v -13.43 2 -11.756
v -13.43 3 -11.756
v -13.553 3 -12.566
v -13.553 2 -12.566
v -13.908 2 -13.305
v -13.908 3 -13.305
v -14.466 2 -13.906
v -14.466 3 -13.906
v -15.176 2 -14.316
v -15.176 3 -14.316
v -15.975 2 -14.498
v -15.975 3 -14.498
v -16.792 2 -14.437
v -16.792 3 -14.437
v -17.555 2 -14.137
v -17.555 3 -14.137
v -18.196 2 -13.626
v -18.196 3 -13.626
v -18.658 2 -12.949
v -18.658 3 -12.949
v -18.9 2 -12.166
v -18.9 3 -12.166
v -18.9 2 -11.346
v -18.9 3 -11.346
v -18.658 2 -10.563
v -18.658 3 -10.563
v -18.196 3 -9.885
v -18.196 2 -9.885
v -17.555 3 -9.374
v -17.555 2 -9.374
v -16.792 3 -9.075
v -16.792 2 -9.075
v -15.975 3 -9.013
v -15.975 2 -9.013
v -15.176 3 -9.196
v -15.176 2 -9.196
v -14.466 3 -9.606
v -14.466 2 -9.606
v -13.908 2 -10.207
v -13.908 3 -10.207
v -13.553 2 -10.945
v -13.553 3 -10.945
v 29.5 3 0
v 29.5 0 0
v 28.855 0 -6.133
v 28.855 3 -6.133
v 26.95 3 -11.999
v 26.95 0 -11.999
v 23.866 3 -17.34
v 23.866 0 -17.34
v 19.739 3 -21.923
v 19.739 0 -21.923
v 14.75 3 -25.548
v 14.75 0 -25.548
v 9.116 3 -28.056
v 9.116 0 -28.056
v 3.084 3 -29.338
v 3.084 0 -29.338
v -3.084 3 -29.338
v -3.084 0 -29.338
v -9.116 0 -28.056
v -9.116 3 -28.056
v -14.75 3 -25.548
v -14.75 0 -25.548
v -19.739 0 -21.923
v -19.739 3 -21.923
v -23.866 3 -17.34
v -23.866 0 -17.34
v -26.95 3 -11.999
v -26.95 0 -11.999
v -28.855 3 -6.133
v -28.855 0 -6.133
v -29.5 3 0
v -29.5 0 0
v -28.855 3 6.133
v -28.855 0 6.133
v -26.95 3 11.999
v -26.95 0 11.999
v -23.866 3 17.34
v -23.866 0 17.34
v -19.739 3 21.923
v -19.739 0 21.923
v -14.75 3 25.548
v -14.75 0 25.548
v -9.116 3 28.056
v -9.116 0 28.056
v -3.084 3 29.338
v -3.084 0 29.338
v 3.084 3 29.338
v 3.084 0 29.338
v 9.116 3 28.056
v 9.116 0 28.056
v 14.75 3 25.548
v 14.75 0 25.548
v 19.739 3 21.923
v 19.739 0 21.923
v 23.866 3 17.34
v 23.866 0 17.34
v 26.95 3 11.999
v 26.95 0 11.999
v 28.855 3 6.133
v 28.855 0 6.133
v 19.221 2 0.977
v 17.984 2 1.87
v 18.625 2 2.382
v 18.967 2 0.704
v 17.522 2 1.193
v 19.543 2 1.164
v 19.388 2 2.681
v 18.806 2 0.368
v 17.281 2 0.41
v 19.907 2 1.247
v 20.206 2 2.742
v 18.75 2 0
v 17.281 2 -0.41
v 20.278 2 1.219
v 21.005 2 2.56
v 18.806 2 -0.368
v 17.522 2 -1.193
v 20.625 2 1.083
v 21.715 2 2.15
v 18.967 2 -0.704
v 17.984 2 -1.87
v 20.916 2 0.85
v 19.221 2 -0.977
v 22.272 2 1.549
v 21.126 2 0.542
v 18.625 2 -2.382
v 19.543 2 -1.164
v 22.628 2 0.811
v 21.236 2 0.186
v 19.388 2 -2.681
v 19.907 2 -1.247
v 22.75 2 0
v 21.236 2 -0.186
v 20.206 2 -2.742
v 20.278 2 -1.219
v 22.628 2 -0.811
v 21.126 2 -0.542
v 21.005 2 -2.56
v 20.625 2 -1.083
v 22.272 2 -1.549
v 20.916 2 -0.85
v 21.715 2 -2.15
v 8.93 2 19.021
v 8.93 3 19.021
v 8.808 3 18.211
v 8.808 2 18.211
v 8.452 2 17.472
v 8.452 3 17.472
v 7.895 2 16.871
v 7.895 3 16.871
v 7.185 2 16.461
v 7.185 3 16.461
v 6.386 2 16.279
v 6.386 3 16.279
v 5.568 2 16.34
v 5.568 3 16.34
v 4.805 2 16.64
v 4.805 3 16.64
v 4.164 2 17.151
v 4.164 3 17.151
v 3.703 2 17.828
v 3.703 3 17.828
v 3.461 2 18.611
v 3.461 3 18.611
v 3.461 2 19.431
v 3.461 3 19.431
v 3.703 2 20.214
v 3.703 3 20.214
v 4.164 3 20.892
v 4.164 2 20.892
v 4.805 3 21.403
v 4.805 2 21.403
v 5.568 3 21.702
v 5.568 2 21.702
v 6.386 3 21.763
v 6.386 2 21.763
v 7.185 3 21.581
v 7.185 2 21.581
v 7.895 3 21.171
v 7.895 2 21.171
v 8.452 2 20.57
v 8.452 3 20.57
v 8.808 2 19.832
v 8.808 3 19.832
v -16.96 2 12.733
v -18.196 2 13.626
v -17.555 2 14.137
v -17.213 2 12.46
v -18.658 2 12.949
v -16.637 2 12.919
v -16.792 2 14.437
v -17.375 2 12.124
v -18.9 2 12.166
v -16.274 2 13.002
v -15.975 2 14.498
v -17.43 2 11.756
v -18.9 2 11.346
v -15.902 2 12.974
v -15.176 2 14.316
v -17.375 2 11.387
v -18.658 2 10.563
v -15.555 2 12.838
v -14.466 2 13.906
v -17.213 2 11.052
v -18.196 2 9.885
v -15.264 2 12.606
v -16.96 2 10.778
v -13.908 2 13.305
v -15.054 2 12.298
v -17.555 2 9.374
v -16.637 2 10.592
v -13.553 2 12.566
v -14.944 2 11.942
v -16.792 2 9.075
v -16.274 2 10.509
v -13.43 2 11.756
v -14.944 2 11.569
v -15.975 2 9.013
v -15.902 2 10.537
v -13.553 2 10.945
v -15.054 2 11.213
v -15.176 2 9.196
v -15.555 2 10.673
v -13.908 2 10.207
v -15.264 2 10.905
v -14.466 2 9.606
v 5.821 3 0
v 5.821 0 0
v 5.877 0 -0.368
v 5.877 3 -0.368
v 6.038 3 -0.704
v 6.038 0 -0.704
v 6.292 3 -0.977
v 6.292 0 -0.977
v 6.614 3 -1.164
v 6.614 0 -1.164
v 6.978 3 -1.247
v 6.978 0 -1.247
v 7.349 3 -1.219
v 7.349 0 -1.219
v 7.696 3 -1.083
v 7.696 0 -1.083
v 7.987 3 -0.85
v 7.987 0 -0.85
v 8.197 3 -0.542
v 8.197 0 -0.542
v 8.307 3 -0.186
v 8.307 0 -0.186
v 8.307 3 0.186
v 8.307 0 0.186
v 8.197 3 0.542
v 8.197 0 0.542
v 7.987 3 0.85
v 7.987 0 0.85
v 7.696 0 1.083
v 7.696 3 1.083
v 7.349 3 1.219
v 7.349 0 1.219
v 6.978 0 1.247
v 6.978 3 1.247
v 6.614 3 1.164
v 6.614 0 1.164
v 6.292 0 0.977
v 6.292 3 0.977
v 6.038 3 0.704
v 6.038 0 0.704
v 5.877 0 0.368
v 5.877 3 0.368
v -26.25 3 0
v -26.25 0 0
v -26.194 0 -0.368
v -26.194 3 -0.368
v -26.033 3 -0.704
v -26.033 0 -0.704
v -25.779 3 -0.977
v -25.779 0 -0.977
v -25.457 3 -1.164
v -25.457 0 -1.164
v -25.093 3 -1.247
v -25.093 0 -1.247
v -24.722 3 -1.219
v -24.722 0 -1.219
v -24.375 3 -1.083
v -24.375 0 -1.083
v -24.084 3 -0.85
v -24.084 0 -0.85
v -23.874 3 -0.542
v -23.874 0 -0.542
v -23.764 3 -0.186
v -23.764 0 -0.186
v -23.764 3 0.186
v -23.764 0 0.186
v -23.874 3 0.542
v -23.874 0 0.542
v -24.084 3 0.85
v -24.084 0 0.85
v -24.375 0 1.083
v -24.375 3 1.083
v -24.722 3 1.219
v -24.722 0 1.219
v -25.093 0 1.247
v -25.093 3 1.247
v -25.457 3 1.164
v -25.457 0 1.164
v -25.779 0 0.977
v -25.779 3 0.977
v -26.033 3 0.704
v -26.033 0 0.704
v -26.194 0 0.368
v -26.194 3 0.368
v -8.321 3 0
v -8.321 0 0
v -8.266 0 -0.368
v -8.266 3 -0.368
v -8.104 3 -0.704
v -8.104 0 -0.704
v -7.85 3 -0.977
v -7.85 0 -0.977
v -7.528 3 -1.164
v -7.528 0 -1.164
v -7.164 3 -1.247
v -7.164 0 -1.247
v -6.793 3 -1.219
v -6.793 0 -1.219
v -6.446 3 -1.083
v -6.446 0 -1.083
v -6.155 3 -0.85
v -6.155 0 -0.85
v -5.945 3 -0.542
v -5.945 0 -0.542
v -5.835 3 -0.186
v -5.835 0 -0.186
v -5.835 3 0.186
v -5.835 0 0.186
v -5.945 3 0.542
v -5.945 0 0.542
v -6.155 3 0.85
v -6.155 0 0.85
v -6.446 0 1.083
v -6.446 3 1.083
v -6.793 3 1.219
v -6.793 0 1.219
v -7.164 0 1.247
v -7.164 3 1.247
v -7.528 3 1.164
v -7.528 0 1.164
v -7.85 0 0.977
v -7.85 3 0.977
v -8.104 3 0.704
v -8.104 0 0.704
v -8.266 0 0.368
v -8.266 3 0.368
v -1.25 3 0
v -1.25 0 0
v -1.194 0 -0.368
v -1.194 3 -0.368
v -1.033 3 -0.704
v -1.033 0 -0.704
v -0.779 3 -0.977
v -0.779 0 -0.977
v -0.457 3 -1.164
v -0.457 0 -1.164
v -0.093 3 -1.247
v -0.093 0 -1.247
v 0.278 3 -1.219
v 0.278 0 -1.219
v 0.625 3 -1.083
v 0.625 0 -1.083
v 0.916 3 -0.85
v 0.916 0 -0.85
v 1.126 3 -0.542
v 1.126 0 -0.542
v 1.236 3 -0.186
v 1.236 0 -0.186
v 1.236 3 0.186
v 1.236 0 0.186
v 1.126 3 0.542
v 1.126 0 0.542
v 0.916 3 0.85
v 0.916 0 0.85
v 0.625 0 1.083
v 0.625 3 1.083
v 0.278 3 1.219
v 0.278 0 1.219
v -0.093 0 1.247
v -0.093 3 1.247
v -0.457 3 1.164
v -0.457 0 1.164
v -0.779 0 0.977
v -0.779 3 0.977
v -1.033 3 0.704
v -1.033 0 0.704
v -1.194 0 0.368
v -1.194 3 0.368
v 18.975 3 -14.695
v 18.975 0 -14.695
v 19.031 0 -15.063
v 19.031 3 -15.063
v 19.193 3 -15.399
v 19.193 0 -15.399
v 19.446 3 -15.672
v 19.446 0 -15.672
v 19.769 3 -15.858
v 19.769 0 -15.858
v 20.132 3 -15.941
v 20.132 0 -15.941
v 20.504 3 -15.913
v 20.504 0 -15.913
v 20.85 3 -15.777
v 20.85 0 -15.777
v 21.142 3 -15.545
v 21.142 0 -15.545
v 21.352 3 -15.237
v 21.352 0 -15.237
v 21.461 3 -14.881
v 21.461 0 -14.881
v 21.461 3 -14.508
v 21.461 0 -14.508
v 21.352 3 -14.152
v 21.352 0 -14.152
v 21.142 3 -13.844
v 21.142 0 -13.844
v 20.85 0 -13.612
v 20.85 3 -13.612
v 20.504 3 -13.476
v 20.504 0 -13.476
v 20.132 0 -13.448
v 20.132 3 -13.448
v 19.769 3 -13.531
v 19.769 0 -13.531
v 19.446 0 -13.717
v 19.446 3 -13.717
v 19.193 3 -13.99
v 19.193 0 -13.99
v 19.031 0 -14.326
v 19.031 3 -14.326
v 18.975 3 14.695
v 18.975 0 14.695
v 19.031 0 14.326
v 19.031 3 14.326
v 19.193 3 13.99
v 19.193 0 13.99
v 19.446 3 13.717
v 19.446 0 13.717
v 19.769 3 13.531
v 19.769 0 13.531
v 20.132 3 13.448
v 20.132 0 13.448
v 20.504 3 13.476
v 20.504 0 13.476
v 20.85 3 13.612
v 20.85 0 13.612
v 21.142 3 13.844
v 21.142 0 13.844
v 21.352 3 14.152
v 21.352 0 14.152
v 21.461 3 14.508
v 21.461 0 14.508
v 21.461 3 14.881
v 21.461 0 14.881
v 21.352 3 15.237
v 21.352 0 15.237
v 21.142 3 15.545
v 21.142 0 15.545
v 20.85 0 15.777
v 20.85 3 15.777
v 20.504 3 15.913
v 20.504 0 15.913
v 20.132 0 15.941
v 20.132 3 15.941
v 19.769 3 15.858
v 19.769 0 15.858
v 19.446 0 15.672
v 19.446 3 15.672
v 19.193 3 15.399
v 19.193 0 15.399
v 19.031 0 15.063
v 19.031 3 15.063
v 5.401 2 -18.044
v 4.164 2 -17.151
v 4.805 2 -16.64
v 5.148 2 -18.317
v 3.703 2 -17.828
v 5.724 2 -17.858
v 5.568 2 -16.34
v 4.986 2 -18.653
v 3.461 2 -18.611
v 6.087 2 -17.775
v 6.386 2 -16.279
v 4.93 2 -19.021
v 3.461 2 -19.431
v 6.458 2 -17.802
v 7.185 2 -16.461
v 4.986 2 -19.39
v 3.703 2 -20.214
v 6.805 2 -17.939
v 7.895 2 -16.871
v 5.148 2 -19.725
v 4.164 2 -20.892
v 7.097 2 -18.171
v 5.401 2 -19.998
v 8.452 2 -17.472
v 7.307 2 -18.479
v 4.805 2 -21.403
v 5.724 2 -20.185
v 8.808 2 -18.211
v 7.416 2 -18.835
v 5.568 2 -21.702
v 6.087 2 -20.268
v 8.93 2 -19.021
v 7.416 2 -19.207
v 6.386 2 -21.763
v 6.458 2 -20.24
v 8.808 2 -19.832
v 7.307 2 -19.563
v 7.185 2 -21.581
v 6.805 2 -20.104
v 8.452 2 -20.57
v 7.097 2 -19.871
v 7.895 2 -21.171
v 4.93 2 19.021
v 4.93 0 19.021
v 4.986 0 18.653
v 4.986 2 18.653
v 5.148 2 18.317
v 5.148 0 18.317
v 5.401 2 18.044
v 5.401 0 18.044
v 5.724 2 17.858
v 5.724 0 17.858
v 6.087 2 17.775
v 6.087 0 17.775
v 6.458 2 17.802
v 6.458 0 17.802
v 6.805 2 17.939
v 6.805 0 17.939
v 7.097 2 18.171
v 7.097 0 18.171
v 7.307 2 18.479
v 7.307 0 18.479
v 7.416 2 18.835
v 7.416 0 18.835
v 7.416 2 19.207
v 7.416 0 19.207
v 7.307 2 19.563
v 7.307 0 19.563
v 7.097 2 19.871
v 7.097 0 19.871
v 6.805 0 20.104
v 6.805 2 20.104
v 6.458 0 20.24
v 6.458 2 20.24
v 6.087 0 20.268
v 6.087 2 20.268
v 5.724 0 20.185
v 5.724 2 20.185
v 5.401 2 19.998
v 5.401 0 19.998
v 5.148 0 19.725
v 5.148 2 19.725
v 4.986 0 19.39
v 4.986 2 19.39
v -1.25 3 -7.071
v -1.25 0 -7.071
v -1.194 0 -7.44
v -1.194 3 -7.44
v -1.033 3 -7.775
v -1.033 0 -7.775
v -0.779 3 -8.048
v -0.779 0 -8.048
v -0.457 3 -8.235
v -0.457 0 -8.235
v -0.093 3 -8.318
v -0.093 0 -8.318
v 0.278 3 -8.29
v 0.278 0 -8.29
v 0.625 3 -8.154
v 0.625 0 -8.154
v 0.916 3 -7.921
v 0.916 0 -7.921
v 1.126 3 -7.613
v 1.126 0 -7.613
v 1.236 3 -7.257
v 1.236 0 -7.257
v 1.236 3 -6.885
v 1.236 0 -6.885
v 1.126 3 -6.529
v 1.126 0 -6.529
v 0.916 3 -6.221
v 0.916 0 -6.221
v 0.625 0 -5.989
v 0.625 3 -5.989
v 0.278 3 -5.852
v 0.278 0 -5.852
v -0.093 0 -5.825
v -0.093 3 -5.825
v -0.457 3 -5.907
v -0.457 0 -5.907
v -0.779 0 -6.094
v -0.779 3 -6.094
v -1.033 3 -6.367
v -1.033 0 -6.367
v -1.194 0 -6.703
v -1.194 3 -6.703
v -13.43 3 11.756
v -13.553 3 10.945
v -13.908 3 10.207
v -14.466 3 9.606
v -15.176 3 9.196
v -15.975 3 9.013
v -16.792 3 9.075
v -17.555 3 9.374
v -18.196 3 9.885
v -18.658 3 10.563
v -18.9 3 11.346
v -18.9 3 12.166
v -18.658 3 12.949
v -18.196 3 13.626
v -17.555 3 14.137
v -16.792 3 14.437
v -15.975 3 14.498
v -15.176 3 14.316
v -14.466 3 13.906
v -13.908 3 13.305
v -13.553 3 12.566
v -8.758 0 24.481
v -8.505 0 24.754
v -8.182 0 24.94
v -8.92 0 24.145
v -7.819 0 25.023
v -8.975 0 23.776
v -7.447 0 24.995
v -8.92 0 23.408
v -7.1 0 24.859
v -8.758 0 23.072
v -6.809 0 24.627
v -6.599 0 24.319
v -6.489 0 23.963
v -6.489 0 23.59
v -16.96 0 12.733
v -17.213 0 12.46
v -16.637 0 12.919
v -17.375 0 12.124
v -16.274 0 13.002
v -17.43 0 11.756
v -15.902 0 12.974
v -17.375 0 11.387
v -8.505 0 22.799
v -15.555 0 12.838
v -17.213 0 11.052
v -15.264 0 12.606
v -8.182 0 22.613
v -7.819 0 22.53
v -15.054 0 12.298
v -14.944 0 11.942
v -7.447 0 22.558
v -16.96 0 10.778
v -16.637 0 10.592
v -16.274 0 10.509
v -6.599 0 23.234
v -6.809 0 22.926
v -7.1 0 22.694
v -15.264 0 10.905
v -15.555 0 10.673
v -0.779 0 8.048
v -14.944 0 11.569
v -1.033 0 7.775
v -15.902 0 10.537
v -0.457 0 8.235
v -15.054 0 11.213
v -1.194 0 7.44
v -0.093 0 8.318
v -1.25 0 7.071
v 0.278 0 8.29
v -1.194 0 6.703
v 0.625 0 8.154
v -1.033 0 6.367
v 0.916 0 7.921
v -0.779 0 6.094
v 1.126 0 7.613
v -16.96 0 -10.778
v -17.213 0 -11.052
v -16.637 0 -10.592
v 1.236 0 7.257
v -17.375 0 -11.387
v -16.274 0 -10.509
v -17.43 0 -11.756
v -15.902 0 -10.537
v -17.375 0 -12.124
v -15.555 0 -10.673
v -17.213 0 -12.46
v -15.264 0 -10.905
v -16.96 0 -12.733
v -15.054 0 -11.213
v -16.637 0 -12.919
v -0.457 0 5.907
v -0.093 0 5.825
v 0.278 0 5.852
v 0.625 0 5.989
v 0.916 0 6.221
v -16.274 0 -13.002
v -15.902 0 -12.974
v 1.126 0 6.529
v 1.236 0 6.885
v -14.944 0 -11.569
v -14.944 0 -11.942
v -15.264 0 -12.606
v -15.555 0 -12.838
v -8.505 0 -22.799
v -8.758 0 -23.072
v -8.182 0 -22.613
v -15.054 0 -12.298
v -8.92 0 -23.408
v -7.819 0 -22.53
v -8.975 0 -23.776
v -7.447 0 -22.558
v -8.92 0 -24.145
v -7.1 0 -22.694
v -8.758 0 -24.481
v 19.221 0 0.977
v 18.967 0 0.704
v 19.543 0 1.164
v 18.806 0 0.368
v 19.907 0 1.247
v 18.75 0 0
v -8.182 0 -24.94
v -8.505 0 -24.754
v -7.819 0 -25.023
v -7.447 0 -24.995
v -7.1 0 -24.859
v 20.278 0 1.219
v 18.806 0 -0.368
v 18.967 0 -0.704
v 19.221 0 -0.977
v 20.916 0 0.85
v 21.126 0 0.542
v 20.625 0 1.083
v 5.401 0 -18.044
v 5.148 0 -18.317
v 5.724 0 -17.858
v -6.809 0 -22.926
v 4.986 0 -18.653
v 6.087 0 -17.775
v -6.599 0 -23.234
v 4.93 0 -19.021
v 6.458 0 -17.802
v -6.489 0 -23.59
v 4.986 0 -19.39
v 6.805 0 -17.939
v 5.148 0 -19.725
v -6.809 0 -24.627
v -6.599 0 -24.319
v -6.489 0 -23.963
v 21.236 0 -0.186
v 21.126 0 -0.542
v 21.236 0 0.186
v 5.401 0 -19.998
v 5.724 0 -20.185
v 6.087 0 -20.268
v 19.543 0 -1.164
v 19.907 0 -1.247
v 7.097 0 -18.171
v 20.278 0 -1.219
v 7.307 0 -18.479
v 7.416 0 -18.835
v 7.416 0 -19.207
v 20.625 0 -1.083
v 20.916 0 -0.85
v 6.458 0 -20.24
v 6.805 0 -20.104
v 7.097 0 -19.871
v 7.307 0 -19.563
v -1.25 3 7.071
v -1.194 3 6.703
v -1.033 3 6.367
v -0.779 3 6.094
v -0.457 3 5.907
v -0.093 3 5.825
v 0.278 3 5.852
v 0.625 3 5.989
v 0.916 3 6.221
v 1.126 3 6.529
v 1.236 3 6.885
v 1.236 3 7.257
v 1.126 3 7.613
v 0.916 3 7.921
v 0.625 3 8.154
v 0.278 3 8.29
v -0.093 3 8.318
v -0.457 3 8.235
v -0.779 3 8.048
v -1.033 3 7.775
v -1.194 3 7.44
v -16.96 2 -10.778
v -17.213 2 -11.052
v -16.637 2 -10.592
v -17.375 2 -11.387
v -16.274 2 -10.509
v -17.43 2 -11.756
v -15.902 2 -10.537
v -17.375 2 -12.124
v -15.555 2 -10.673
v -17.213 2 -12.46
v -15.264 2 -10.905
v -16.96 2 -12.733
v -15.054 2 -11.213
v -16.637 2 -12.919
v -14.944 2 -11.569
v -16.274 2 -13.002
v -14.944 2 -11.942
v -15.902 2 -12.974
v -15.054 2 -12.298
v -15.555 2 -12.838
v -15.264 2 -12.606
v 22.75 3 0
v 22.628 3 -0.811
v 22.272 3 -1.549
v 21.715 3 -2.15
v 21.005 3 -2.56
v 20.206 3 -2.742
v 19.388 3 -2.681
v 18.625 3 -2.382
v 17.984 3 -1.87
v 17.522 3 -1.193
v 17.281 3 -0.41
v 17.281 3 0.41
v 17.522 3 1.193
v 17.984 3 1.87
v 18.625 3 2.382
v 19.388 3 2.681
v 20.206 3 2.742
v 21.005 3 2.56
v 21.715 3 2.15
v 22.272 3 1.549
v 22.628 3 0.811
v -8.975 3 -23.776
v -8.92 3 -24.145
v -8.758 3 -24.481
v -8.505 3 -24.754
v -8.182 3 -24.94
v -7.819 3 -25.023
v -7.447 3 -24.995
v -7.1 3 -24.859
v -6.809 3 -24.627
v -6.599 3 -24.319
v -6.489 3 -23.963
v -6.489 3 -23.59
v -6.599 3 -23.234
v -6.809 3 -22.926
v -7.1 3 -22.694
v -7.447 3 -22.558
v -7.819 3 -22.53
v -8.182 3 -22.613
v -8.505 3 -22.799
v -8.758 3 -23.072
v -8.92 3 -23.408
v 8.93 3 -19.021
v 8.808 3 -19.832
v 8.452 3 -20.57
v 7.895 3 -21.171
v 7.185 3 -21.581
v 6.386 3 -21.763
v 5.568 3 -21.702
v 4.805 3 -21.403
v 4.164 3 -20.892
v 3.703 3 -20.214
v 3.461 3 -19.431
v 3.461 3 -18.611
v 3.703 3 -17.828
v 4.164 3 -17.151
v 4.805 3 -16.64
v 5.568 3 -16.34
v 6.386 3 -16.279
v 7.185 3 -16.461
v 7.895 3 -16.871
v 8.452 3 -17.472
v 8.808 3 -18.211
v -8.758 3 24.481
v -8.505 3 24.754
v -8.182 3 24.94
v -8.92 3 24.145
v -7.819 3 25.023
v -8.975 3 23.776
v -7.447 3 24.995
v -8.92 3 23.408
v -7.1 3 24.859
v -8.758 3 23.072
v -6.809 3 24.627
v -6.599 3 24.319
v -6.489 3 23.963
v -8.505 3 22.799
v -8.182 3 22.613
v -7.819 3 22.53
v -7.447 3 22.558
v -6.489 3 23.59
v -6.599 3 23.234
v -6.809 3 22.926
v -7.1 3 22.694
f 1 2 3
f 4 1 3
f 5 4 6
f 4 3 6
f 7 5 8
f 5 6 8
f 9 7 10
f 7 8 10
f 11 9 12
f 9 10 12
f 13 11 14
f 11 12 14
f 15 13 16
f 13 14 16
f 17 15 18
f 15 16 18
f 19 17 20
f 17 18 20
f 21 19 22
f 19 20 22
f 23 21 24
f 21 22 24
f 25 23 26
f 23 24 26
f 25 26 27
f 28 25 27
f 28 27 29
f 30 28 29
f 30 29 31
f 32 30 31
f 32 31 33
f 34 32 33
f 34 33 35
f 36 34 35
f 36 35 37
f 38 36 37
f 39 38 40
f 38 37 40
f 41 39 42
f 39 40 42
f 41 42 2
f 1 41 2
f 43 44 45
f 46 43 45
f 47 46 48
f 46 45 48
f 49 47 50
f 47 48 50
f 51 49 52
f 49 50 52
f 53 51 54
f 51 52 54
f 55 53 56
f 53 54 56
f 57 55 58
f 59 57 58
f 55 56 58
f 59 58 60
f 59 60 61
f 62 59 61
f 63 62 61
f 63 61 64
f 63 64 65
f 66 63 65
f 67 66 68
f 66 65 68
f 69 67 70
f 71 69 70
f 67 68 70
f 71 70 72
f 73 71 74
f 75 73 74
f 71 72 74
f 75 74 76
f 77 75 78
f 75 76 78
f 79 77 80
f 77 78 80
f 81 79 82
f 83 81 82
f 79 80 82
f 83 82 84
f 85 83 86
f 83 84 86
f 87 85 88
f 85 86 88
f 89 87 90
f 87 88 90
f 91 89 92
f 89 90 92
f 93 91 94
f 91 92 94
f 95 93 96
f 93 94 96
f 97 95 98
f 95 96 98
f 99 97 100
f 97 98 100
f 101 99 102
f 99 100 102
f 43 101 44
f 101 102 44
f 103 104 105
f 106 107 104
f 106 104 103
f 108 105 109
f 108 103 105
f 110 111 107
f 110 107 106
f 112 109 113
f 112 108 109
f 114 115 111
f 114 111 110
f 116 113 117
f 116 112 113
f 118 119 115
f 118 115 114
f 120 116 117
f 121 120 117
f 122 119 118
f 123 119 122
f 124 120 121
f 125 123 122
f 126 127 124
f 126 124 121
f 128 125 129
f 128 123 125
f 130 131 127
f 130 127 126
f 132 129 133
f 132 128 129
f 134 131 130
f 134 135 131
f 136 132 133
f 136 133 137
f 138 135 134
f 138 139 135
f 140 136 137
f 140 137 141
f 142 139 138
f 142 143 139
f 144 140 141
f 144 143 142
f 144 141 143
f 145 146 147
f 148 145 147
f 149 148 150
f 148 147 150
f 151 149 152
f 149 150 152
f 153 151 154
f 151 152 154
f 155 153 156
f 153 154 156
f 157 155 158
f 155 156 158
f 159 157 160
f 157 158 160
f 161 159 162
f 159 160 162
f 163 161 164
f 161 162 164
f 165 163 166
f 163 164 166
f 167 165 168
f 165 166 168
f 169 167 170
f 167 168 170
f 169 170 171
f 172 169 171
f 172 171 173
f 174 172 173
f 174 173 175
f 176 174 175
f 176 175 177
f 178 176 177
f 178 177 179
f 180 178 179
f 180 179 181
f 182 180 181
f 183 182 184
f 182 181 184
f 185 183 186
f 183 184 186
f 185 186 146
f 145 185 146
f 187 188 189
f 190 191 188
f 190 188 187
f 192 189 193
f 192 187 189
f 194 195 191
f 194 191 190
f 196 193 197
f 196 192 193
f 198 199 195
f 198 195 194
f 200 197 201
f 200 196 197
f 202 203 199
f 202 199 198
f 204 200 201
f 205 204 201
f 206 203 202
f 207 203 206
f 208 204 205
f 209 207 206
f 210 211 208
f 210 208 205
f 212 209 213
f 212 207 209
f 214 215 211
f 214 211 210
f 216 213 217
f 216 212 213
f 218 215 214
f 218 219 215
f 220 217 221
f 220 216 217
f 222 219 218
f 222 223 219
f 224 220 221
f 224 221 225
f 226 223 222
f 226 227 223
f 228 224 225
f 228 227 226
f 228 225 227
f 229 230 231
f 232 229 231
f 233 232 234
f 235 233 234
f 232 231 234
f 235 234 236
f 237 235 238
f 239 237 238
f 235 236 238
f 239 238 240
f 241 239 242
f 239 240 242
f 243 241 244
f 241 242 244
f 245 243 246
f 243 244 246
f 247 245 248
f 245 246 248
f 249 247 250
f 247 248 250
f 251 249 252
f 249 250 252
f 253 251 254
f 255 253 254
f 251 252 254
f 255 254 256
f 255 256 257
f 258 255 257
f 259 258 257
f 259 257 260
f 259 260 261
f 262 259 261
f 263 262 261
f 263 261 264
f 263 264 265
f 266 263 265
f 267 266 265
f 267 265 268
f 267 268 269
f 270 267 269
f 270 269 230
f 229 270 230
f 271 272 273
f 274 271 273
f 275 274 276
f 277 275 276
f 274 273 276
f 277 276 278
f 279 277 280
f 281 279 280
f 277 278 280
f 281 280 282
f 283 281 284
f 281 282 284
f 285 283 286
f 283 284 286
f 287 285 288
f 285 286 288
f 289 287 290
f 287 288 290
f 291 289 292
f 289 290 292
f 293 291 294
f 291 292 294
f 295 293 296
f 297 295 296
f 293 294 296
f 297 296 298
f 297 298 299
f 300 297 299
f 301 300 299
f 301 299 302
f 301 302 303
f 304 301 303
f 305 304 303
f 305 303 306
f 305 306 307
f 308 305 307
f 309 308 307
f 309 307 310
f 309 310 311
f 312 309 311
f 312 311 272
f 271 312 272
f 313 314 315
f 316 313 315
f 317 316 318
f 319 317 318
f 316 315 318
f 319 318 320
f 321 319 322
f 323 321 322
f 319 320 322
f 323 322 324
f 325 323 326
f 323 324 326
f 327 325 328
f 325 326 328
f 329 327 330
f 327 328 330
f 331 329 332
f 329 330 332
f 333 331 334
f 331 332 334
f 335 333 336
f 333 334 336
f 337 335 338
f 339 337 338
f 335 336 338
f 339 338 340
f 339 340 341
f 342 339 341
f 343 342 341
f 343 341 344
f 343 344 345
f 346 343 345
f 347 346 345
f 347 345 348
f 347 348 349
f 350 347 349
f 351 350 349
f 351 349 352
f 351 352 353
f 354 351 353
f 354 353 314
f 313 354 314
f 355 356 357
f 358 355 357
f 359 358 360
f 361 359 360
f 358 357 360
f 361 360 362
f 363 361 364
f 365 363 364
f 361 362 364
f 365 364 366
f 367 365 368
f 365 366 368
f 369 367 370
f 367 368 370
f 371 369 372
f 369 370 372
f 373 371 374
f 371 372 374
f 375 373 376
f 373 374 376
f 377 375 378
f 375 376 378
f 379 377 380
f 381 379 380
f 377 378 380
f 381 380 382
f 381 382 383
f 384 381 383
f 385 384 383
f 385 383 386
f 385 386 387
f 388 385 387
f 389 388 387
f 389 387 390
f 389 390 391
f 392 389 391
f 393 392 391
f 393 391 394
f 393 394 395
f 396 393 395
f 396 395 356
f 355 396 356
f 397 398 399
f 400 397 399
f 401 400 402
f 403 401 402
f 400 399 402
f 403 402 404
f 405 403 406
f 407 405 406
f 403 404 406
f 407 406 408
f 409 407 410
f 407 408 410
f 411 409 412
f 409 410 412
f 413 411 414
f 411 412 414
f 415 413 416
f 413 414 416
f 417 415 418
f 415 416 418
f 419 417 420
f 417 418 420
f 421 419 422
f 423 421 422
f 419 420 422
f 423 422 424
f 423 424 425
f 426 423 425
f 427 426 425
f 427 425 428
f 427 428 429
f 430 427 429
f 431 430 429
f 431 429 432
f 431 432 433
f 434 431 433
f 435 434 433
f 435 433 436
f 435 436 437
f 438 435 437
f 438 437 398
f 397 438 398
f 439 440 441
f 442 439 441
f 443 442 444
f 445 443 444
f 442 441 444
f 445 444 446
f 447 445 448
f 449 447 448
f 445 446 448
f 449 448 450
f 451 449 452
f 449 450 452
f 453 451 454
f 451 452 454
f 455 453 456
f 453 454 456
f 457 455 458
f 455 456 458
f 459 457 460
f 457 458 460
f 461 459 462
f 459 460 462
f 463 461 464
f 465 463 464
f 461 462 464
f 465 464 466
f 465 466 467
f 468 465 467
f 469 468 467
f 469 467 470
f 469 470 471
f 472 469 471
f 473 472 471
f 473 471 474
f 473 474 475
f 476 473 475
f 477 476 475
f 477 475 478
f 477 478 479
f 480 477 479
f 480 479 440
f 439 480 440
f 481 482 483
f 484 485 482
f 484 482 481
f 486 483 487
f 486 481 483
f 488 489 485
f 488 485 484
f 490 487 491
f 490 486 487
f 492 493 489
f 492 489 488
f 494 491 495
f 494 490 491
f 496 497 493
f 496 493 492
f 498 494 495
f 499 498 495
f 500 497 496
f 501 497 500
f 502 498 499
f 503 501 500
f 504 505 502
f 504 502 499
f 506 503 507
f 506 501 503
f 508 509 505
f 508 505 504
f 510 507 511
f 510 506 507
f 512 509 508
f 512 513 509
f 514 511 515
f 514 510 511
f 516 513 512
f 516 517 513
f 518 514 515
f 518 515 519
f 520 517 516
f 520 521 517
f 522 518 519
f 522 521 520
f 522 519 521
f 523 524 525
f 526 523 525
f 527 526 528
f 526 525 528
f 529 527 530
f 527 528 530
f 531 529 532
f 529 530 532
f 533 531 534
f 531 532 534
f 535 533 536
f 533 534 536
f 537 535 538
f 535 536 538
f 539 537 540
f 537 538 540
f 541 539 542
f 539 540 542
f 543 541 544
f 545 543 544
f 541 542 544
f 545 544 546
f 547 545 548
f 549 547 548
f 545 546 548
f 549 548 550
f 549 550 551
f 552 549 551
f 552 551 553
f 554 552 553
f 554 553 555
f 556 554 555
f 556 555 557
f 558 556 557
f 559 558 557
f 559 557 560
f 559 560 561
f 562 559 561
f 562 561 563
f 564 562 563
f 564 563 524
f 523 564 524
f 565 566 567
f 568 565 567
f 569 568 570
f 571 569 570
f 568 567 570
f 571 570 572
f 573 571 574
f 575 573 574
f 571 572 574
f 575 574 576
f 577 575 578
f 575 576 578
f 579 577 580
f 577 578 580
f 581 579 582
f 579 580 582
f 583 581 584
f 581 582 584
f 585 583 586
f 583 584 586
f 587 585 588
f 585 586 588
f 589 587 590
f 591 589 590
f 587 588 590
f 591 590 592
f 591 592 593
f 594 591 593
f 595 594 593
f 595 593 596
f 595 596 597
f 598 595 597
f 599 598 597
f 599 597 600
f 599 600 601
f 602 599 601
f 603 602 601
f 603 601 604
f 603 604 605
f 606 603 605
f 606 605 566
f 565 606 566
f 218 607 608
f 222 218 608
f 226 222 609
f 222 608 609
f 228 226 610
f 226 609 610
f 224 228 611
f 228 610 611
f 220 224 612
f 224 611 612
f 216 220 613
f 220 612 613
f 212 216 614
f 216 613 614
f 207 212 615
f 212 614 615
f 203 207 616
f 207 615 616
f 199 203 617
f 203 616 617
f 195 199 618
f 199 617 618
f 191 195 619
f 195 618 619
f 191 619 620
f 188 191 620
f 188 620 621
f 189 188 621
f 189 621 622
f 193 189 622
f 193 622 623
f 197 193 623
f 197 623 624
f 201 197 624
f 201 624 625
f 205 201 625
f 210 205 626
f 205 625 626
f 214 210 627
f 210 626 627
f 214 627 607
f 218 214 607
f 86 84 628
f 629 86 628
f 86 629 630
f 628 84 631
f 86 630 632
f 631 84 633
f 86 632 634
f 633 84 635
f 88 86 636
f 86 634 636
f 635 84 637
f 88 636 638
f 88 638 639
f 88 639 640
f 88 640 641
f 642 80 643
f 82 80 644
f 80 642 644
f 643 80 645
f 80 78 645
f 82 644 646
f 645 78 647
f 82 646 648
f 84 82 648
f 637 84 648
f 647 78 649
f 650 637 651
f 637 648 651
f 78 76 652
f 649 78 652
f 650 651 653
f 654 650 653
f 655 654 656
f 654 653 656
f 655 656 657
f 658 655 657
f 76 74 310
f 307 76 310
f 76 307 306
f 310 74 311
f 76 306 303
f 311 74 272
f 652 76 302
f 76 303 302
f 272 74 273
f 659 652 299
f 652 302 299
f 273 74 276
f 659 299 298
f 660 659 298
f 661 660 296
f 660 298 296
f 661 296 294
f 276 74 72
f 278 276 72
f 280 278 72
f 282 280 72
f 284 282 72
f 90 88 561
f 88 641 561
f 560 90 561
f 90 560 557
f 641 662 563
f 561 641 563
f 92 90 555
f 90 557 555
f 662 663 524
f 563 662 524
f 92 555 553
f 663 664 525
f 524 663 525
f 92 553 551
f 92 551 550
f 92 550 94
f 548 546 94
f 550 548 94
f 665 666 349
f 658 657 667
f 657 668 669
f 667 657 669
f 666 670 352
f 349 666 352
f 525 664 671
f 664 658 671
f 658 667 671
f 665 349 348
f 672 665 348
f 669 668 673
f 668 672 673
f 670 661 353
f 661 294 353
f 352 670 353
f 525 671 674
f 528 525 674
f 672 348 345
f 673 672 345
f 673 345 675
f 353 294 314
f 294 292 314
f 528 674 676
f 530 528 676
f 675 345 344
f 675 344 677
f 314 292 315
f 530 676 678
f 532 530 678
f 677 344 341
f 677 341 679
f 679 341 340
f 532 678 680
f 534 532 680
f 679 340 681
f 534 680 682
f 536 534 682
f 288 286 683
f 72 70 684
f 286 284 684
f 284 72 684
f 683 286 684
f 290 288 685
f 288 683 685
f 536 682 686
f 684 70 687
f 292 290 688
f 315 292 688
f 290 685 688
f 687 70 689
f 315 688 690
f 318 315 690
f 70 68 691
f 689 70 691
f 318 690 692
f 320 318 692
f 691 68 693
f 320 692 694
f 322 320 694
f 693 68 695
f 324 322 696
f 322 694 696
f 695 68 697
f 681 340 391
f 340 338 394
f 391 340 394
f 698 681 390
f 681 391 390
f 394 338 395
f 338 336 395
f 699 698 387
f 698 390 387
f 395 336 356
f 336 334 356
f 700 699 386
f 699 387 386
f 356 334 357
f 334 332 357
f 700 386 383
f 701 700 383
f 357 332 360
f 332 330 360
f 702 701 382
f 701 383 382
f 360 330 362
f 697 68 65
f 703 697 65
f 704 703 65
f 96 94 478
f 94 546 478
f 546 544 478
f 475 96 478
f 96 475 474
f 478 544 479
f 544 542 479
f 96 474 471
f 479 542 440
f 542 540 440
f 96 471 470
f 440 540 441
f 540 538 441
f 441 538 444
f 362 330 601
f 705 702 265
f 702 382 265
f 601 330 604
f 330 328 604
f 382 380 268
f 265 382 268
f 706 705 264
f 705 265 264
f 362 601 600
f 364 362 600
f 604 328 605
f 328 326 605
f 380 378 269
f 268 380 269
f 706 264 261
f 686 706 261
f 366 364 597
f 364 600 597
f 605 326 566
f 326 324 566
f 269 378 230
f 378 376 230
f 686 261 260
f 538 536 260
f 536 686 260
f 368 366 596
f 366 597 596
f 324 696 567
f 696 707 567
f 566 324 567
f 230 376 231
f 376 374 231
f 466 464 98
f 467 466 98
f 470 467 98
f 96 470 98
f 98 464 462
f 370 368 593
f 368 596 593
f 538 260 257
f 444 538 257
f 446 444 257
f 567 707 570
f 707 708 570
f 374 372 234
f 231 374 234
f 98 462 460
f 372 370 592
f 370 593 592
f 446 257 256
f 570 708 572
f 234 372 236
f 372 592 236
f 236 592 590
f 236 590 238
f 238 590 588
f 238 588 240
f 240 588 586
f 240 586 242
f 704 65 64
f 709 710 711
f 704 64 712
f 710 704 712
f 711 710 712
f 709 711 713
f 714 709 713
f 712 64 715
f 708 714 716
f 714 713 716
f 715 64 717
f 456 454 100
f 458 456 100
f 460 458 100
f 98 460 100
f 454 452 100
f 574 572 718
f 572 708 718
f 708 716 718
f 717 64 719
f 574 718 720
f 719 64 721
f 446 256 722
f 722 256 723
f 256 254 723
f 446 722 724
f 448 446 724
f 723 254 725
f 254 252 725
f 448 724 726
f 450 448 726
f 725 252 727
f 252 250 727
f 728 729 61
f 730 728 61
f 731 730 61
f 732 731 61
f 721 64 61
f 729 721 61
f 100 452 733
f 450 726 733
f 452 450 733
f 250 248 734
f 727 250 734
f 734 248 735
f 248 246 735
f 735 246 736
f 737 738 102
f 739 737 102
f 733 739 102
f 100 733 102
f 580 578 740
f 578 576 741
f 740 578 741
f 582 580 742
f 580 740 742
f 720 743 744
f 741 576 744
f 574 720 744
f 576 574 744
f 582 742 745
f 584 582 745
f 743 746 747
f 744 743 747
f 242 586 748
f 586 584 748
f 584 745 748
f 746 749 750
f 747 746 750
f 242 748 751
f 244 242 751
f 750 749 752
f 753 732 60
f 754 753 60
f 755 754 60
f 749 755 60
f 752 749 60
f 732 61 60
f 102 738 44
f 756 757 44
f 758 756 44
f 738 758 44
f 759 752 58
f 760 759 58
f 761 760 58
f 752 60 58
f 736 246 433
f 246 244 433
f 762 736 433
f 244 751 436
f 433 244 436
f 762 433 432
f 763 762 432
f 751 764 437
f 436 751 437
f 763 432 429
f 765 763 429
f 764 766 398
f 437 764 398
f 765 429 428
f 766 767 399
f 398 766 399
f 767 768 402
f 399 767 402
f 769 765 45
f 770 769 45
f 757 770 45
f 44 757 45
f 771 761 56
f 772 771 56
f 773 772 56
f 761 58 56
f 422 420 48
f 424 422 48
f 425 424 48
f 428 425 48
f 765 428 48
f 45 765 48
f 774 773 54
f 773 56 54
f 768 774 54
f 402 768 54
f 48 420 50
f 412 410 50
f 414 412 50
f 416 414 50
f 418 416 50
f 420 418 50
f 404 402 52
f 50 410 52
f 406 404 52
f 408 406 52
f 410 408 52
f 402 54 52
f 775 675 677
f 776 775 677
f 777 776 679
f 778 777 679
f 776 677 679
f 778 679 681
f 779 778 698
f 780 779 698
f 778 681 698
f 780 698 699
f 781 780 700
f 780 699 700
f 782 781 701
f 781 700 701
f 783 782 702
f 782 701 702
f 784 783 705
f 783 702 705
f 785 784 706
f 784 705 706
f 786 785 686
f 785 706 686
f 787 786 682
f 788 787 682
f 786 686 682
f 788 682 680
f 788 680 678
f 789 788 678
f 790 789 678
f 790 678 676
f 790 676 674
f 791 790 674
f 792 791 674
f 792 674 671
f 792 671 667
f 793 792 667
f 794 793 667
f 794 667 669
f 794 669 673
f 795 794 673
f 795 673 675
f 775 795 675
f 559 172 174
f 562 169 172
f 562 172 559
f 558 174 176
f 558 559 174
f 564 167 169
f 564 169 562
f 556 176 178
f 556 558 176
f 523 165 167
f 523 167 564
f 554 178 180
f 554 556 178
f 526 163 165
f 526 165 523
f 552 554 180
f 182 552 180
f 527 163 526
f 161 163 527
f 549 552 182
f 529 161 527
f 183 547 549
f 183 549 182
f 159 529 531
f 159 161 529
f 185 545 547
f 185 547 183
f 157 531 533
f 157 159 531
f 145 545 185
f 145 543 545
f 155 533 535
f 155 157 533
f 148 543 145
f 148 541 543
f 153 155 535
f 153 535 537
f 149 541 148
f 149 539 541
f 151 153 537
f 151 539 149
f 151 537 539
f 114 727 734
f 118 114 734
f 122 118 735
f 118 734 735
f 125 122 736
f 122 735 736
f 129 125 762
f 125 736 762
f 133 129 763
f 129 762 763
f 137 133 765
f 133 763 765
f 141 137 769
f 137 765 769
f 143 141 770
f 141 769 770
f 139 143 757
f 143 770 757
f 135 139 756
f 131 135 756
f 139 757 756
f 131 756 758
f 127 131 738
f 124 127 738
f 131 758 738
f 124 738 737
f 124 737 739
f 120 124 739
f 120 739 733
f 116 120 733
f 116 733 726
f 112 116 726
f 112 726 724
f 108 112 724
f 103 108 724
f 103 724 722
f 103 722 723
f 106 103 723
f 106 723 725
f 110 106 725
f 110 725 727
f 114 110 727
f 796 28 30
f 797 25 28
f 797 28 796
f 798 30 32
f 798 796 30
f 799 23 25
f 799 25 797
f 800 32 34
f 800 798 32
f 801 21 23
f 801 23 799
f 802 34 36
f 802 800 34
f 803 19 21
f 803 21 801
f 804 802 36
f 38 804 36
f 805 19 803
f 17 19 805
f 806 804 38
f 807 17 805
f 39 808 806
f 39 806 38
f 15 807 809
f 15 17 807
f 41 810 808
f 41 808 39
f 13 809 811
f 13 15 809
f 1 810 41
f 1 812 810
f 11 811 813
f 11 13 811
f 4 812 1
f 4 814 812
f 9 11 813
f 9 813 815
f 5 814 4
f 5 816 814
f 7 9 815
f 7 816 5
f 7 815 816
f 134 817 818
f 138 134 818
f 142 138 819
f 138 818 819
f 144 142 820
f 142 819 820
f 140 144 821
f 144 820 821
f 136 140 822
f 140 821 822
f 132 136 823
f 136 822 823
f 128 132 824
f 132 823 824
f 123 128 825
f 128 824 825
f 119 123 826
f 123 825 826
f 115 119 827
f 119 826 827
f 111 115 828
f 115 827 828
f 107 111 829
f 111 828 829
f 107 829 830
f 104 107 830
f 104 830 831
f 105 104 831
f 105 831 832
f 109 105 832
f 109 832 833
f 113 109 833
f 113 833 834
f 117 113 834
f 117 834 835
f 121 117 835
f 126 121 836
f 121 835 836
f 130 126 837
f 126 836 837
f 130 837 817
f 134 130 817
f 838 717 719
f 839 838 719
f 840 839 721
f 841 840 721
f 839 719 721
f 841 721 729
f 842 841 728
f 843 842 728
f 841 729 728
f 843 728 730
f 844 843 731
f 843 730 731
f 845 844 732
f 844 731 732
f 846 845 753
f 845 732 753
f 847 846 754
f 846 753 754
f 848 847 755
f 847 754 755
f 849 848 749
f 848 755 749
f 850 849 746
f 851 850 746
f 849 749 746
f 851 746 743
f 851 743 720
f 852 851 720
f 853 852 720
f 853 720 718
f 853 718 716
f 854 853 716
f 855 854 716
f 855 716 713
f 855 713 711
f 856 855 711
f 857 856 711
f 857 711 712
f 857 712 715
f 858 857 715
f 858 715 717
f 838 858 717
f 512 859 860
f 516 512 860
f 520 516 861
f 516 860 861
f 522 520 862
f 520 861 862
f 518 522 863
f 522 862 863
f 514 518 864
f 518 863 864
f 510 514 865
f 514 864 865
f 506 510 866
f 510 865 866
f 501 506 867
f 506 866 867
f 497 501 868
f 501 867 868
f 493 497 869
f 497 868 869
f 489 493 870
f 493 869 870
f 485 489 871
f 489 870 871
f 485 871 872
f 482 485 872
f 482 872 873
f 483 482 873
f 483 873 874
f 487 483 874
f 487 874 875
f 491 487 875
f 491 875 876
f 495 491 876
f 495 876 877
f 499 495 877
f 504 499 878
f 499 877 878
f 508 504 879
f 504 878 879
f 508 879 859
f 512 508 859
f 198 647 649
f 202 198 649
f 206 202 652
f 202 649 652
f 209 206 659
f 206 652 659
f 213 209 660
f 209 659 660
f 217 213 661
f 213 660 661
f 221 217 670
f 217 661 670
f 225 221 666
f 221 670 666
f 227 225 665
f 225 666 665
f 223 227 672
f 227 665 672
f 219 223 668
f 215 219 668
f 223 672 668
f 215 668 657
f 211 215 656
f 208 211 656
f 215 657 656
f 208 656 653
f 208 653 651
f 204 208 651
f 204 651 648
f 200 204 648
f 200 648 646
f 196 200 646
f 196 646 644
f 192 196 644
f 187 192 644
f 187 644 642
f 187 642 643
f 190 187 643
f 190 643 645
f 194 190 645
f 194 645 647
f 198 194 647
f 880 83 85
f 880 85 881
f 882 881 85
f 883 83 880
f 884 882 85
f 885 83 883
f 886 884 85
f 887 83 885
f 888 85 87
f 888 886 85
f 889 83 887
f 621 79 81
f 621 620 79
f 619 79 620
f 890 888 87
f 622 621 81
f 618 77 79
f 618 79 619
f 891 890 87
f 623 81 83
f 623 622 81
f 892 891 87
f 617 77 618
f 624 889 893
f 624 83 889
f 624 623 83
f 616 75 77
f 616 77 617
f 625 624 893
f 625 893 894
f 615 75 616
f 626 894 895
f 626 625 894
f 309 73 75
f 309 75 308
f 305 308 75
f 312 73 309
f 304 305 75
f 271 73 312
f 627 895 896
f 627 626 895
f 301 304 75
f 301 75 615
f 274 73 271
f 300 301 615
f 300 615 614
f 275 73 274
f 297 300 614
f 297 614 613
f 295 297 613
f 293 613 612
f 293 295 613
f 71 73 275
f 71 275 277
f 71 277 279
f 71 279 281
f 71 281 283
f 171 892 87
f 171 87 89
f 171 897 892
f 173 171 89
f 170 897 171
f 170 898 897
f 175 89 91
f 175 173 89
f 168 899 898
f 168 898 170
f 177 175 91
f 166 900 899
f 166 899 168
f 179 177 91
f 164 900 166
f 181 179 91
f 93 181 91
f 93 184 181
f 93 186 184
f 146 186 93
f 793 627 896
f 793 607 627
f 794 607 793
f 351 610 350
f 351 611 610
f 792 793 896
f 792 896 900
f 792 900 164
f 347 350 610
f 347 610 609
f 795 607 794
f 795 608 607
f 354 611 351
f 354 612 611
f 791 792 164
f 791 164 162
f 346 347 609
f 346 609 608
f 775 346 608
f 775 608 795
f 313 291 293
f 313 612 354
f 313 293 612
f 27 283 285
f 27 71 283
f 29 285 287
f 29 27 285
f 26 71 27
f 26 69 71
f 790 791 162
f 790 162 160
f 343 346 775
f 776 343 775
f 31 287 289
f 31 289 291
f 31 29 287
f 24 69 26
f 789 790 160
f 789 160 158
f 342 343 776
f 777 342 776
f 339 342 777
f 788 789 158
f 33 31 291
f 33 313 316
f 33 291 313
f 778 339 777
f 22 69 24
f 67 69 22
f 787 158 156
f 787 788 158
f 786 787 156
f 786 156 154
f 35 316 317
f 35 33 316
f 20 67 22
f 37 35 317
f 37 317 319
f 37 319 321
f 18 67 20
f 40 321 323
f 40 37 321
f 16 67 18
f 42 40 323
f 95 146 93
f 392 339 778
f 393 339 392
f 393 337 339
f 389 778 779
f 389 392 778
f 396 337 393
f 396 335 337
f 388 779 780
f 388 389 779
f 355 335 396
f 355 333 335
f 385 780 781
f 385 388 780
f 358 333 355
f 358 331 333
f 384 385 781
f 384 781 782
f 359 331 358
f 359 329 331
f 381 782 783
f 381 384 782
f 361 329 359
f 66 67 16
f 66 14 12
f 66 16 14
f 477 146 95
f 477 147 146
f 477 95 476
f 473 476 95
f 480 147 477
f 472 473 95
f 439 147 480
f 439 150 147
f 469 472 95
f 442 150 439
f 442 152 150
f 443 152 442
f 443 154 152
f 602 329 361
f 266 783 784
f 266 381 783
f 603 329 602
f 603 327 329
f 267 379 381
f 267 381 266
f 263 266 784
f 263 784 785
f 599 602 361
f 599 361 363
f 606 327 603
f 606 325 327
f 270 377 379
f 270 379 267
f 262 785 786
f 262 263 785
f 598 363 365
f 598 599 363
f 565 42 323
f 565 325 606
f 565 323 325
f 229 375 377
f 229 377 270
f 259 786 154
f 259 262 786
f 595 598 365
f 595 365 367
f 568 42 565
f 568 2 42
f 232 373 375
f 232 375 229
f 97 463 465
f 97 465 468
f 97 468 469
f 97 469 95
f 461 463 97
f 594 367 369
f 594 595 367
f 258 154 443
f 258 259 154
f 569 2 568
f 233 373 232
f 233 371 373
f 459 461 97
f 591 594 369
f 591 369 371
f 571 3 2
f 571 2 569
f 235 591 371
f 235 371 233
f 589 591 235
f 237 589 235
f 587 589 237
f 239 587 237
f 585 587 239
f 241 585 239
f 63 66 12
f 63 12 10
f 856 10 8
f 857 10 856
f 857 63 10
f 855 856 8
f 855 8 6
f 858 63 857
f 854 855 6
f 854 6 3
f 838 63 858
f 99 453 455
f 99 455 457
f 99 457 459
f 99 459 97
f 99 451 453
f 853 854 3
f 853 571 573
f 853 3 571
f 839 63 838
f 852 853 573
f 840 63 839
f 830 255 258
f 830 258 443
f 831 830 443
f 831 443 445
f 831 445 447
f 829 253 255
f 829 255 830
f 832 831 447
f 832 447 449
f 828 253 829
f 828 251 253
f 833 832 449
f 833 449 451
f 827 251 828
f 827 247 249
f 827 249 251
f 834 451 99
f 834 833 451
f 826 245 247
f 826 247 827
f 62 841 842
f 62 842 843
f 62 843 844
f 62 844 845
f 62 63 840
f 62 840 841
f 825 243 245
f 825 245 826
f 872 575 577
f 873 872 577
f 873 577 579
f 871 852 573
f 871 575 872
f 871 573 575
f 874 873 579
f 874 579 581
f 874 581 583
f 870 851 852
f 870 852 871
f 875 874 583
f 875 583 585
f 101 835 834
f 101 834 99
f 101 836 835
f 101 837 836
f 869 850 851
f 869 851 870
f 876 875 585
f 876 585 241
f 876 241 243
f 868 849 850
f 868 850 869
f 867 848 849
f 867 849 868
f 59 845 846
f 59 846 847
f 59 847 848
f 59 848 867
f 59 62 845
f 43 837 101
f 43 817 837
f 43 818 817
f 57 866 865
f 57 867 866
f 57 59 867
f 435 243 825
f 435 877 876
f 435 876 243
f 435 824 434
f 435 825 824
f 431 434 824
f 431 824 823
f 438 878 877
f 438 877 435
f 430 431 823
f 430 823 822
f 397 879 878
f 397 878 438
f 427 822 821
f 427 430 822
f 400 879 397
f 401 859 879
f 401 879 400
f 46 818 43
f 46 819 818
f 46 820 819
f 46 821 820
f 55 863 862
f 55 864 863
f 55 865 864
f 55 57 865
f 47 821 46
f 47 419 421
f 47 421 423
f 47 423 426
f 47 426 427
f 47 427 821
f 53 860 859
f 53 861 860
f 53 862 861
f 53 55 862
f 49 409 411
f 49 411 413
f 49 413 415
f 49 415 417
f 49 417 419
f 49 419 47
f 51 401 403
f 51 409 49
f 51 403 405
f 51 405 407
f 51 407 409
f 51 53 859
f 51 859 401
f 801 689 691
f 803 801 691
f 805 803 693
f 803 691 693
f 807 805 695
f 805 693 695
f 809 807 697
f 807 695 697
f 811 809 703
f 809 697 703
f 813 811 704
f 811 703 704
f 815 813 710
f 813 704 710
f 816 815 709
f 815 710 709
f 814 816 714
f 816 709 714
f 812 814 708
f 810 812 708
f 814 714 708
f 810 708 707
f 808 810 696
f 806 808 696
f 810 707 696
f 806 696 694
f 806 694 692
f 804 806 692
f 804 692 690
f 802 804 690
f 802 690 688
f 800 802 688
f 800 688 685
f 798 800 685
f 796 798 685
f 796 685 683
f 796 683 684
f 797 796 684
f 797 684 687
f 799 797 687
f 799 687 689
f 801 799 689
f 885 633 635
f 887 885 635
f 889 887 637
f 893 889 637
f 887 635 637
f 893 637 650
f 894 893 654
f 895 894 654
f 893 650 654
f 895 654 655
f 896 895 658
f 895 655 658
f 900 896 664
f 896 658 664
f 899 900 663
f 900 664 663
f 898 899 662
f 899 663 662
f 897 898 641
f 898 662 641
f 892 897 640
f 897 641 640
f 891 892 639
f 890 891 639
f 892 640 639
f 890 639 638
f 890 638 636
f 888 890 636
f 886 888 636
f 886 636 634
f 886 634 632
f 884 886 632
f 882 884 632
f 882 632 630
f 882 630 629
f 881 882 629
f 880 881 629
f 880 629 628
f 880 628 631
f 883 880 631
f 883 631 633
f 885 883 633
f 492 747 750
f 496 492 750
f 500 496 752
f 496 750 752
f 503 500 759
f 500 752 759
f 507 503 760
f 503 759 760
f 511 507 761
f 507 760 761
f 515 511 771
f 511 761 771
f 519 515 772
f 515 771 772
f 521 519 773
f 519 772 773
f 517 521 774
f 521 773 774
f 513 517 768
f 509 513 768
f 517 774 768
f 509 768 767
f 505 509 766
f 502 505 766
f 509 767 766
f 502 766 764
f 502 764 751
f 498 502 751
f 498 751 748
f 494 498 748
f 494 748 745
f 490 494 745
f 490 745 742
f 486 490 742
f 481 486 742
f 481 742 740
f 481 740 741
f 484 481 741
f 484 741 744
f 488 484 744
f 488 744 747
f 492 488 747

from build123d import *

# Parameters (mm, degrees)
SKETCH_1_R               = 29.5
EXTRUDE_1_DEPTH          = 3
HOLE_WIZARD_M3_4_D       = 2.5
HOLE_WIZARD_M3_1_D       = 2.5
SKETCH_9_R               = 2.75
CUT_EXTRUDE_1_DEPTH      = 1
CUT_EXTRUDE_1_DEPTH_BACK = 1


with BuildPart() as part:
    # 草图1 → 凸台-拉伸1 (new body)
    with BuildSketch(Plane(origin=(0, 0, 0), x_dir=(1, 0, 0), z_dir=(0, 1, 0))):
        Circle(SKETCH_1_R)
    extrude(amount=EXTRUDE_1_DEPTH)

    # M3 螺纹孔4 (through all)
    with Locations(Plane(origin=(0, 3, 0), x_dir=(1, 0, 0), z_dir=(0, 1, 0))):
        with Locations((6.180339887, 19.021130326), (20, 0), (6.180339887, -19.021130326), (-16.180339887, -11.755705046), (-16.180339887, 11.755705046)):
            Hole(HOLE_WIZARD_M3_4_D / 2)

    # M3 螺纹孔1 (through all)
    with Locations(Plane(origin=(0, 3, 0), x_dir=(1, 0, 0), z_dir=(0, 1, 0))):
        with Locations((20.225424859, -14.694631307), (-25, 0), (-7.071067812, 0), (-7.725424859, 23.776412907), (20.225424859, 14.694631307), (-7.725424859, -23.776412907), (0, 0), (0, 7.071067812), (7.071067812, 0), (0, -7.071067812)):
            Hole(HOLE_WIZARD_M3_1_D / 2)

    # 草图9 → 切除-拉伸1 (cut, two sides)
    with BuildSketch(Plane(origin=(0, 3, 0), x_dir=(1, 0, 0), z_dir=(0, 1, 0))) as cut_extrude_1_sk:
        with Locations((20, 0)):
            Circle(SKETCH_9_R)
        with Locations((6.180339887, -19.021130326)):
            Circle(SKETCH_9_R)
        with Locations((-16.180339887, -11.755705046)):
            Circle(SKETCH_9_R)
        with Locations((-16.180339887, 11.755705046)):
            Circle(SKETCH_9_R)
        with Locations((6.180339887, 19.021130326)):
            Circle(SKETCH_9_R)
    extrude(amount=CUT_EXTRUDE_1_DEPTH, mode=Mode.SUBTRACT)
    extrude(cut_extrude_1_sk.sketch, amount=-CUT_EXTRUDE_1_DEPTH_BACK, mode=Mode.SUBTRACT)


solid = part.part
